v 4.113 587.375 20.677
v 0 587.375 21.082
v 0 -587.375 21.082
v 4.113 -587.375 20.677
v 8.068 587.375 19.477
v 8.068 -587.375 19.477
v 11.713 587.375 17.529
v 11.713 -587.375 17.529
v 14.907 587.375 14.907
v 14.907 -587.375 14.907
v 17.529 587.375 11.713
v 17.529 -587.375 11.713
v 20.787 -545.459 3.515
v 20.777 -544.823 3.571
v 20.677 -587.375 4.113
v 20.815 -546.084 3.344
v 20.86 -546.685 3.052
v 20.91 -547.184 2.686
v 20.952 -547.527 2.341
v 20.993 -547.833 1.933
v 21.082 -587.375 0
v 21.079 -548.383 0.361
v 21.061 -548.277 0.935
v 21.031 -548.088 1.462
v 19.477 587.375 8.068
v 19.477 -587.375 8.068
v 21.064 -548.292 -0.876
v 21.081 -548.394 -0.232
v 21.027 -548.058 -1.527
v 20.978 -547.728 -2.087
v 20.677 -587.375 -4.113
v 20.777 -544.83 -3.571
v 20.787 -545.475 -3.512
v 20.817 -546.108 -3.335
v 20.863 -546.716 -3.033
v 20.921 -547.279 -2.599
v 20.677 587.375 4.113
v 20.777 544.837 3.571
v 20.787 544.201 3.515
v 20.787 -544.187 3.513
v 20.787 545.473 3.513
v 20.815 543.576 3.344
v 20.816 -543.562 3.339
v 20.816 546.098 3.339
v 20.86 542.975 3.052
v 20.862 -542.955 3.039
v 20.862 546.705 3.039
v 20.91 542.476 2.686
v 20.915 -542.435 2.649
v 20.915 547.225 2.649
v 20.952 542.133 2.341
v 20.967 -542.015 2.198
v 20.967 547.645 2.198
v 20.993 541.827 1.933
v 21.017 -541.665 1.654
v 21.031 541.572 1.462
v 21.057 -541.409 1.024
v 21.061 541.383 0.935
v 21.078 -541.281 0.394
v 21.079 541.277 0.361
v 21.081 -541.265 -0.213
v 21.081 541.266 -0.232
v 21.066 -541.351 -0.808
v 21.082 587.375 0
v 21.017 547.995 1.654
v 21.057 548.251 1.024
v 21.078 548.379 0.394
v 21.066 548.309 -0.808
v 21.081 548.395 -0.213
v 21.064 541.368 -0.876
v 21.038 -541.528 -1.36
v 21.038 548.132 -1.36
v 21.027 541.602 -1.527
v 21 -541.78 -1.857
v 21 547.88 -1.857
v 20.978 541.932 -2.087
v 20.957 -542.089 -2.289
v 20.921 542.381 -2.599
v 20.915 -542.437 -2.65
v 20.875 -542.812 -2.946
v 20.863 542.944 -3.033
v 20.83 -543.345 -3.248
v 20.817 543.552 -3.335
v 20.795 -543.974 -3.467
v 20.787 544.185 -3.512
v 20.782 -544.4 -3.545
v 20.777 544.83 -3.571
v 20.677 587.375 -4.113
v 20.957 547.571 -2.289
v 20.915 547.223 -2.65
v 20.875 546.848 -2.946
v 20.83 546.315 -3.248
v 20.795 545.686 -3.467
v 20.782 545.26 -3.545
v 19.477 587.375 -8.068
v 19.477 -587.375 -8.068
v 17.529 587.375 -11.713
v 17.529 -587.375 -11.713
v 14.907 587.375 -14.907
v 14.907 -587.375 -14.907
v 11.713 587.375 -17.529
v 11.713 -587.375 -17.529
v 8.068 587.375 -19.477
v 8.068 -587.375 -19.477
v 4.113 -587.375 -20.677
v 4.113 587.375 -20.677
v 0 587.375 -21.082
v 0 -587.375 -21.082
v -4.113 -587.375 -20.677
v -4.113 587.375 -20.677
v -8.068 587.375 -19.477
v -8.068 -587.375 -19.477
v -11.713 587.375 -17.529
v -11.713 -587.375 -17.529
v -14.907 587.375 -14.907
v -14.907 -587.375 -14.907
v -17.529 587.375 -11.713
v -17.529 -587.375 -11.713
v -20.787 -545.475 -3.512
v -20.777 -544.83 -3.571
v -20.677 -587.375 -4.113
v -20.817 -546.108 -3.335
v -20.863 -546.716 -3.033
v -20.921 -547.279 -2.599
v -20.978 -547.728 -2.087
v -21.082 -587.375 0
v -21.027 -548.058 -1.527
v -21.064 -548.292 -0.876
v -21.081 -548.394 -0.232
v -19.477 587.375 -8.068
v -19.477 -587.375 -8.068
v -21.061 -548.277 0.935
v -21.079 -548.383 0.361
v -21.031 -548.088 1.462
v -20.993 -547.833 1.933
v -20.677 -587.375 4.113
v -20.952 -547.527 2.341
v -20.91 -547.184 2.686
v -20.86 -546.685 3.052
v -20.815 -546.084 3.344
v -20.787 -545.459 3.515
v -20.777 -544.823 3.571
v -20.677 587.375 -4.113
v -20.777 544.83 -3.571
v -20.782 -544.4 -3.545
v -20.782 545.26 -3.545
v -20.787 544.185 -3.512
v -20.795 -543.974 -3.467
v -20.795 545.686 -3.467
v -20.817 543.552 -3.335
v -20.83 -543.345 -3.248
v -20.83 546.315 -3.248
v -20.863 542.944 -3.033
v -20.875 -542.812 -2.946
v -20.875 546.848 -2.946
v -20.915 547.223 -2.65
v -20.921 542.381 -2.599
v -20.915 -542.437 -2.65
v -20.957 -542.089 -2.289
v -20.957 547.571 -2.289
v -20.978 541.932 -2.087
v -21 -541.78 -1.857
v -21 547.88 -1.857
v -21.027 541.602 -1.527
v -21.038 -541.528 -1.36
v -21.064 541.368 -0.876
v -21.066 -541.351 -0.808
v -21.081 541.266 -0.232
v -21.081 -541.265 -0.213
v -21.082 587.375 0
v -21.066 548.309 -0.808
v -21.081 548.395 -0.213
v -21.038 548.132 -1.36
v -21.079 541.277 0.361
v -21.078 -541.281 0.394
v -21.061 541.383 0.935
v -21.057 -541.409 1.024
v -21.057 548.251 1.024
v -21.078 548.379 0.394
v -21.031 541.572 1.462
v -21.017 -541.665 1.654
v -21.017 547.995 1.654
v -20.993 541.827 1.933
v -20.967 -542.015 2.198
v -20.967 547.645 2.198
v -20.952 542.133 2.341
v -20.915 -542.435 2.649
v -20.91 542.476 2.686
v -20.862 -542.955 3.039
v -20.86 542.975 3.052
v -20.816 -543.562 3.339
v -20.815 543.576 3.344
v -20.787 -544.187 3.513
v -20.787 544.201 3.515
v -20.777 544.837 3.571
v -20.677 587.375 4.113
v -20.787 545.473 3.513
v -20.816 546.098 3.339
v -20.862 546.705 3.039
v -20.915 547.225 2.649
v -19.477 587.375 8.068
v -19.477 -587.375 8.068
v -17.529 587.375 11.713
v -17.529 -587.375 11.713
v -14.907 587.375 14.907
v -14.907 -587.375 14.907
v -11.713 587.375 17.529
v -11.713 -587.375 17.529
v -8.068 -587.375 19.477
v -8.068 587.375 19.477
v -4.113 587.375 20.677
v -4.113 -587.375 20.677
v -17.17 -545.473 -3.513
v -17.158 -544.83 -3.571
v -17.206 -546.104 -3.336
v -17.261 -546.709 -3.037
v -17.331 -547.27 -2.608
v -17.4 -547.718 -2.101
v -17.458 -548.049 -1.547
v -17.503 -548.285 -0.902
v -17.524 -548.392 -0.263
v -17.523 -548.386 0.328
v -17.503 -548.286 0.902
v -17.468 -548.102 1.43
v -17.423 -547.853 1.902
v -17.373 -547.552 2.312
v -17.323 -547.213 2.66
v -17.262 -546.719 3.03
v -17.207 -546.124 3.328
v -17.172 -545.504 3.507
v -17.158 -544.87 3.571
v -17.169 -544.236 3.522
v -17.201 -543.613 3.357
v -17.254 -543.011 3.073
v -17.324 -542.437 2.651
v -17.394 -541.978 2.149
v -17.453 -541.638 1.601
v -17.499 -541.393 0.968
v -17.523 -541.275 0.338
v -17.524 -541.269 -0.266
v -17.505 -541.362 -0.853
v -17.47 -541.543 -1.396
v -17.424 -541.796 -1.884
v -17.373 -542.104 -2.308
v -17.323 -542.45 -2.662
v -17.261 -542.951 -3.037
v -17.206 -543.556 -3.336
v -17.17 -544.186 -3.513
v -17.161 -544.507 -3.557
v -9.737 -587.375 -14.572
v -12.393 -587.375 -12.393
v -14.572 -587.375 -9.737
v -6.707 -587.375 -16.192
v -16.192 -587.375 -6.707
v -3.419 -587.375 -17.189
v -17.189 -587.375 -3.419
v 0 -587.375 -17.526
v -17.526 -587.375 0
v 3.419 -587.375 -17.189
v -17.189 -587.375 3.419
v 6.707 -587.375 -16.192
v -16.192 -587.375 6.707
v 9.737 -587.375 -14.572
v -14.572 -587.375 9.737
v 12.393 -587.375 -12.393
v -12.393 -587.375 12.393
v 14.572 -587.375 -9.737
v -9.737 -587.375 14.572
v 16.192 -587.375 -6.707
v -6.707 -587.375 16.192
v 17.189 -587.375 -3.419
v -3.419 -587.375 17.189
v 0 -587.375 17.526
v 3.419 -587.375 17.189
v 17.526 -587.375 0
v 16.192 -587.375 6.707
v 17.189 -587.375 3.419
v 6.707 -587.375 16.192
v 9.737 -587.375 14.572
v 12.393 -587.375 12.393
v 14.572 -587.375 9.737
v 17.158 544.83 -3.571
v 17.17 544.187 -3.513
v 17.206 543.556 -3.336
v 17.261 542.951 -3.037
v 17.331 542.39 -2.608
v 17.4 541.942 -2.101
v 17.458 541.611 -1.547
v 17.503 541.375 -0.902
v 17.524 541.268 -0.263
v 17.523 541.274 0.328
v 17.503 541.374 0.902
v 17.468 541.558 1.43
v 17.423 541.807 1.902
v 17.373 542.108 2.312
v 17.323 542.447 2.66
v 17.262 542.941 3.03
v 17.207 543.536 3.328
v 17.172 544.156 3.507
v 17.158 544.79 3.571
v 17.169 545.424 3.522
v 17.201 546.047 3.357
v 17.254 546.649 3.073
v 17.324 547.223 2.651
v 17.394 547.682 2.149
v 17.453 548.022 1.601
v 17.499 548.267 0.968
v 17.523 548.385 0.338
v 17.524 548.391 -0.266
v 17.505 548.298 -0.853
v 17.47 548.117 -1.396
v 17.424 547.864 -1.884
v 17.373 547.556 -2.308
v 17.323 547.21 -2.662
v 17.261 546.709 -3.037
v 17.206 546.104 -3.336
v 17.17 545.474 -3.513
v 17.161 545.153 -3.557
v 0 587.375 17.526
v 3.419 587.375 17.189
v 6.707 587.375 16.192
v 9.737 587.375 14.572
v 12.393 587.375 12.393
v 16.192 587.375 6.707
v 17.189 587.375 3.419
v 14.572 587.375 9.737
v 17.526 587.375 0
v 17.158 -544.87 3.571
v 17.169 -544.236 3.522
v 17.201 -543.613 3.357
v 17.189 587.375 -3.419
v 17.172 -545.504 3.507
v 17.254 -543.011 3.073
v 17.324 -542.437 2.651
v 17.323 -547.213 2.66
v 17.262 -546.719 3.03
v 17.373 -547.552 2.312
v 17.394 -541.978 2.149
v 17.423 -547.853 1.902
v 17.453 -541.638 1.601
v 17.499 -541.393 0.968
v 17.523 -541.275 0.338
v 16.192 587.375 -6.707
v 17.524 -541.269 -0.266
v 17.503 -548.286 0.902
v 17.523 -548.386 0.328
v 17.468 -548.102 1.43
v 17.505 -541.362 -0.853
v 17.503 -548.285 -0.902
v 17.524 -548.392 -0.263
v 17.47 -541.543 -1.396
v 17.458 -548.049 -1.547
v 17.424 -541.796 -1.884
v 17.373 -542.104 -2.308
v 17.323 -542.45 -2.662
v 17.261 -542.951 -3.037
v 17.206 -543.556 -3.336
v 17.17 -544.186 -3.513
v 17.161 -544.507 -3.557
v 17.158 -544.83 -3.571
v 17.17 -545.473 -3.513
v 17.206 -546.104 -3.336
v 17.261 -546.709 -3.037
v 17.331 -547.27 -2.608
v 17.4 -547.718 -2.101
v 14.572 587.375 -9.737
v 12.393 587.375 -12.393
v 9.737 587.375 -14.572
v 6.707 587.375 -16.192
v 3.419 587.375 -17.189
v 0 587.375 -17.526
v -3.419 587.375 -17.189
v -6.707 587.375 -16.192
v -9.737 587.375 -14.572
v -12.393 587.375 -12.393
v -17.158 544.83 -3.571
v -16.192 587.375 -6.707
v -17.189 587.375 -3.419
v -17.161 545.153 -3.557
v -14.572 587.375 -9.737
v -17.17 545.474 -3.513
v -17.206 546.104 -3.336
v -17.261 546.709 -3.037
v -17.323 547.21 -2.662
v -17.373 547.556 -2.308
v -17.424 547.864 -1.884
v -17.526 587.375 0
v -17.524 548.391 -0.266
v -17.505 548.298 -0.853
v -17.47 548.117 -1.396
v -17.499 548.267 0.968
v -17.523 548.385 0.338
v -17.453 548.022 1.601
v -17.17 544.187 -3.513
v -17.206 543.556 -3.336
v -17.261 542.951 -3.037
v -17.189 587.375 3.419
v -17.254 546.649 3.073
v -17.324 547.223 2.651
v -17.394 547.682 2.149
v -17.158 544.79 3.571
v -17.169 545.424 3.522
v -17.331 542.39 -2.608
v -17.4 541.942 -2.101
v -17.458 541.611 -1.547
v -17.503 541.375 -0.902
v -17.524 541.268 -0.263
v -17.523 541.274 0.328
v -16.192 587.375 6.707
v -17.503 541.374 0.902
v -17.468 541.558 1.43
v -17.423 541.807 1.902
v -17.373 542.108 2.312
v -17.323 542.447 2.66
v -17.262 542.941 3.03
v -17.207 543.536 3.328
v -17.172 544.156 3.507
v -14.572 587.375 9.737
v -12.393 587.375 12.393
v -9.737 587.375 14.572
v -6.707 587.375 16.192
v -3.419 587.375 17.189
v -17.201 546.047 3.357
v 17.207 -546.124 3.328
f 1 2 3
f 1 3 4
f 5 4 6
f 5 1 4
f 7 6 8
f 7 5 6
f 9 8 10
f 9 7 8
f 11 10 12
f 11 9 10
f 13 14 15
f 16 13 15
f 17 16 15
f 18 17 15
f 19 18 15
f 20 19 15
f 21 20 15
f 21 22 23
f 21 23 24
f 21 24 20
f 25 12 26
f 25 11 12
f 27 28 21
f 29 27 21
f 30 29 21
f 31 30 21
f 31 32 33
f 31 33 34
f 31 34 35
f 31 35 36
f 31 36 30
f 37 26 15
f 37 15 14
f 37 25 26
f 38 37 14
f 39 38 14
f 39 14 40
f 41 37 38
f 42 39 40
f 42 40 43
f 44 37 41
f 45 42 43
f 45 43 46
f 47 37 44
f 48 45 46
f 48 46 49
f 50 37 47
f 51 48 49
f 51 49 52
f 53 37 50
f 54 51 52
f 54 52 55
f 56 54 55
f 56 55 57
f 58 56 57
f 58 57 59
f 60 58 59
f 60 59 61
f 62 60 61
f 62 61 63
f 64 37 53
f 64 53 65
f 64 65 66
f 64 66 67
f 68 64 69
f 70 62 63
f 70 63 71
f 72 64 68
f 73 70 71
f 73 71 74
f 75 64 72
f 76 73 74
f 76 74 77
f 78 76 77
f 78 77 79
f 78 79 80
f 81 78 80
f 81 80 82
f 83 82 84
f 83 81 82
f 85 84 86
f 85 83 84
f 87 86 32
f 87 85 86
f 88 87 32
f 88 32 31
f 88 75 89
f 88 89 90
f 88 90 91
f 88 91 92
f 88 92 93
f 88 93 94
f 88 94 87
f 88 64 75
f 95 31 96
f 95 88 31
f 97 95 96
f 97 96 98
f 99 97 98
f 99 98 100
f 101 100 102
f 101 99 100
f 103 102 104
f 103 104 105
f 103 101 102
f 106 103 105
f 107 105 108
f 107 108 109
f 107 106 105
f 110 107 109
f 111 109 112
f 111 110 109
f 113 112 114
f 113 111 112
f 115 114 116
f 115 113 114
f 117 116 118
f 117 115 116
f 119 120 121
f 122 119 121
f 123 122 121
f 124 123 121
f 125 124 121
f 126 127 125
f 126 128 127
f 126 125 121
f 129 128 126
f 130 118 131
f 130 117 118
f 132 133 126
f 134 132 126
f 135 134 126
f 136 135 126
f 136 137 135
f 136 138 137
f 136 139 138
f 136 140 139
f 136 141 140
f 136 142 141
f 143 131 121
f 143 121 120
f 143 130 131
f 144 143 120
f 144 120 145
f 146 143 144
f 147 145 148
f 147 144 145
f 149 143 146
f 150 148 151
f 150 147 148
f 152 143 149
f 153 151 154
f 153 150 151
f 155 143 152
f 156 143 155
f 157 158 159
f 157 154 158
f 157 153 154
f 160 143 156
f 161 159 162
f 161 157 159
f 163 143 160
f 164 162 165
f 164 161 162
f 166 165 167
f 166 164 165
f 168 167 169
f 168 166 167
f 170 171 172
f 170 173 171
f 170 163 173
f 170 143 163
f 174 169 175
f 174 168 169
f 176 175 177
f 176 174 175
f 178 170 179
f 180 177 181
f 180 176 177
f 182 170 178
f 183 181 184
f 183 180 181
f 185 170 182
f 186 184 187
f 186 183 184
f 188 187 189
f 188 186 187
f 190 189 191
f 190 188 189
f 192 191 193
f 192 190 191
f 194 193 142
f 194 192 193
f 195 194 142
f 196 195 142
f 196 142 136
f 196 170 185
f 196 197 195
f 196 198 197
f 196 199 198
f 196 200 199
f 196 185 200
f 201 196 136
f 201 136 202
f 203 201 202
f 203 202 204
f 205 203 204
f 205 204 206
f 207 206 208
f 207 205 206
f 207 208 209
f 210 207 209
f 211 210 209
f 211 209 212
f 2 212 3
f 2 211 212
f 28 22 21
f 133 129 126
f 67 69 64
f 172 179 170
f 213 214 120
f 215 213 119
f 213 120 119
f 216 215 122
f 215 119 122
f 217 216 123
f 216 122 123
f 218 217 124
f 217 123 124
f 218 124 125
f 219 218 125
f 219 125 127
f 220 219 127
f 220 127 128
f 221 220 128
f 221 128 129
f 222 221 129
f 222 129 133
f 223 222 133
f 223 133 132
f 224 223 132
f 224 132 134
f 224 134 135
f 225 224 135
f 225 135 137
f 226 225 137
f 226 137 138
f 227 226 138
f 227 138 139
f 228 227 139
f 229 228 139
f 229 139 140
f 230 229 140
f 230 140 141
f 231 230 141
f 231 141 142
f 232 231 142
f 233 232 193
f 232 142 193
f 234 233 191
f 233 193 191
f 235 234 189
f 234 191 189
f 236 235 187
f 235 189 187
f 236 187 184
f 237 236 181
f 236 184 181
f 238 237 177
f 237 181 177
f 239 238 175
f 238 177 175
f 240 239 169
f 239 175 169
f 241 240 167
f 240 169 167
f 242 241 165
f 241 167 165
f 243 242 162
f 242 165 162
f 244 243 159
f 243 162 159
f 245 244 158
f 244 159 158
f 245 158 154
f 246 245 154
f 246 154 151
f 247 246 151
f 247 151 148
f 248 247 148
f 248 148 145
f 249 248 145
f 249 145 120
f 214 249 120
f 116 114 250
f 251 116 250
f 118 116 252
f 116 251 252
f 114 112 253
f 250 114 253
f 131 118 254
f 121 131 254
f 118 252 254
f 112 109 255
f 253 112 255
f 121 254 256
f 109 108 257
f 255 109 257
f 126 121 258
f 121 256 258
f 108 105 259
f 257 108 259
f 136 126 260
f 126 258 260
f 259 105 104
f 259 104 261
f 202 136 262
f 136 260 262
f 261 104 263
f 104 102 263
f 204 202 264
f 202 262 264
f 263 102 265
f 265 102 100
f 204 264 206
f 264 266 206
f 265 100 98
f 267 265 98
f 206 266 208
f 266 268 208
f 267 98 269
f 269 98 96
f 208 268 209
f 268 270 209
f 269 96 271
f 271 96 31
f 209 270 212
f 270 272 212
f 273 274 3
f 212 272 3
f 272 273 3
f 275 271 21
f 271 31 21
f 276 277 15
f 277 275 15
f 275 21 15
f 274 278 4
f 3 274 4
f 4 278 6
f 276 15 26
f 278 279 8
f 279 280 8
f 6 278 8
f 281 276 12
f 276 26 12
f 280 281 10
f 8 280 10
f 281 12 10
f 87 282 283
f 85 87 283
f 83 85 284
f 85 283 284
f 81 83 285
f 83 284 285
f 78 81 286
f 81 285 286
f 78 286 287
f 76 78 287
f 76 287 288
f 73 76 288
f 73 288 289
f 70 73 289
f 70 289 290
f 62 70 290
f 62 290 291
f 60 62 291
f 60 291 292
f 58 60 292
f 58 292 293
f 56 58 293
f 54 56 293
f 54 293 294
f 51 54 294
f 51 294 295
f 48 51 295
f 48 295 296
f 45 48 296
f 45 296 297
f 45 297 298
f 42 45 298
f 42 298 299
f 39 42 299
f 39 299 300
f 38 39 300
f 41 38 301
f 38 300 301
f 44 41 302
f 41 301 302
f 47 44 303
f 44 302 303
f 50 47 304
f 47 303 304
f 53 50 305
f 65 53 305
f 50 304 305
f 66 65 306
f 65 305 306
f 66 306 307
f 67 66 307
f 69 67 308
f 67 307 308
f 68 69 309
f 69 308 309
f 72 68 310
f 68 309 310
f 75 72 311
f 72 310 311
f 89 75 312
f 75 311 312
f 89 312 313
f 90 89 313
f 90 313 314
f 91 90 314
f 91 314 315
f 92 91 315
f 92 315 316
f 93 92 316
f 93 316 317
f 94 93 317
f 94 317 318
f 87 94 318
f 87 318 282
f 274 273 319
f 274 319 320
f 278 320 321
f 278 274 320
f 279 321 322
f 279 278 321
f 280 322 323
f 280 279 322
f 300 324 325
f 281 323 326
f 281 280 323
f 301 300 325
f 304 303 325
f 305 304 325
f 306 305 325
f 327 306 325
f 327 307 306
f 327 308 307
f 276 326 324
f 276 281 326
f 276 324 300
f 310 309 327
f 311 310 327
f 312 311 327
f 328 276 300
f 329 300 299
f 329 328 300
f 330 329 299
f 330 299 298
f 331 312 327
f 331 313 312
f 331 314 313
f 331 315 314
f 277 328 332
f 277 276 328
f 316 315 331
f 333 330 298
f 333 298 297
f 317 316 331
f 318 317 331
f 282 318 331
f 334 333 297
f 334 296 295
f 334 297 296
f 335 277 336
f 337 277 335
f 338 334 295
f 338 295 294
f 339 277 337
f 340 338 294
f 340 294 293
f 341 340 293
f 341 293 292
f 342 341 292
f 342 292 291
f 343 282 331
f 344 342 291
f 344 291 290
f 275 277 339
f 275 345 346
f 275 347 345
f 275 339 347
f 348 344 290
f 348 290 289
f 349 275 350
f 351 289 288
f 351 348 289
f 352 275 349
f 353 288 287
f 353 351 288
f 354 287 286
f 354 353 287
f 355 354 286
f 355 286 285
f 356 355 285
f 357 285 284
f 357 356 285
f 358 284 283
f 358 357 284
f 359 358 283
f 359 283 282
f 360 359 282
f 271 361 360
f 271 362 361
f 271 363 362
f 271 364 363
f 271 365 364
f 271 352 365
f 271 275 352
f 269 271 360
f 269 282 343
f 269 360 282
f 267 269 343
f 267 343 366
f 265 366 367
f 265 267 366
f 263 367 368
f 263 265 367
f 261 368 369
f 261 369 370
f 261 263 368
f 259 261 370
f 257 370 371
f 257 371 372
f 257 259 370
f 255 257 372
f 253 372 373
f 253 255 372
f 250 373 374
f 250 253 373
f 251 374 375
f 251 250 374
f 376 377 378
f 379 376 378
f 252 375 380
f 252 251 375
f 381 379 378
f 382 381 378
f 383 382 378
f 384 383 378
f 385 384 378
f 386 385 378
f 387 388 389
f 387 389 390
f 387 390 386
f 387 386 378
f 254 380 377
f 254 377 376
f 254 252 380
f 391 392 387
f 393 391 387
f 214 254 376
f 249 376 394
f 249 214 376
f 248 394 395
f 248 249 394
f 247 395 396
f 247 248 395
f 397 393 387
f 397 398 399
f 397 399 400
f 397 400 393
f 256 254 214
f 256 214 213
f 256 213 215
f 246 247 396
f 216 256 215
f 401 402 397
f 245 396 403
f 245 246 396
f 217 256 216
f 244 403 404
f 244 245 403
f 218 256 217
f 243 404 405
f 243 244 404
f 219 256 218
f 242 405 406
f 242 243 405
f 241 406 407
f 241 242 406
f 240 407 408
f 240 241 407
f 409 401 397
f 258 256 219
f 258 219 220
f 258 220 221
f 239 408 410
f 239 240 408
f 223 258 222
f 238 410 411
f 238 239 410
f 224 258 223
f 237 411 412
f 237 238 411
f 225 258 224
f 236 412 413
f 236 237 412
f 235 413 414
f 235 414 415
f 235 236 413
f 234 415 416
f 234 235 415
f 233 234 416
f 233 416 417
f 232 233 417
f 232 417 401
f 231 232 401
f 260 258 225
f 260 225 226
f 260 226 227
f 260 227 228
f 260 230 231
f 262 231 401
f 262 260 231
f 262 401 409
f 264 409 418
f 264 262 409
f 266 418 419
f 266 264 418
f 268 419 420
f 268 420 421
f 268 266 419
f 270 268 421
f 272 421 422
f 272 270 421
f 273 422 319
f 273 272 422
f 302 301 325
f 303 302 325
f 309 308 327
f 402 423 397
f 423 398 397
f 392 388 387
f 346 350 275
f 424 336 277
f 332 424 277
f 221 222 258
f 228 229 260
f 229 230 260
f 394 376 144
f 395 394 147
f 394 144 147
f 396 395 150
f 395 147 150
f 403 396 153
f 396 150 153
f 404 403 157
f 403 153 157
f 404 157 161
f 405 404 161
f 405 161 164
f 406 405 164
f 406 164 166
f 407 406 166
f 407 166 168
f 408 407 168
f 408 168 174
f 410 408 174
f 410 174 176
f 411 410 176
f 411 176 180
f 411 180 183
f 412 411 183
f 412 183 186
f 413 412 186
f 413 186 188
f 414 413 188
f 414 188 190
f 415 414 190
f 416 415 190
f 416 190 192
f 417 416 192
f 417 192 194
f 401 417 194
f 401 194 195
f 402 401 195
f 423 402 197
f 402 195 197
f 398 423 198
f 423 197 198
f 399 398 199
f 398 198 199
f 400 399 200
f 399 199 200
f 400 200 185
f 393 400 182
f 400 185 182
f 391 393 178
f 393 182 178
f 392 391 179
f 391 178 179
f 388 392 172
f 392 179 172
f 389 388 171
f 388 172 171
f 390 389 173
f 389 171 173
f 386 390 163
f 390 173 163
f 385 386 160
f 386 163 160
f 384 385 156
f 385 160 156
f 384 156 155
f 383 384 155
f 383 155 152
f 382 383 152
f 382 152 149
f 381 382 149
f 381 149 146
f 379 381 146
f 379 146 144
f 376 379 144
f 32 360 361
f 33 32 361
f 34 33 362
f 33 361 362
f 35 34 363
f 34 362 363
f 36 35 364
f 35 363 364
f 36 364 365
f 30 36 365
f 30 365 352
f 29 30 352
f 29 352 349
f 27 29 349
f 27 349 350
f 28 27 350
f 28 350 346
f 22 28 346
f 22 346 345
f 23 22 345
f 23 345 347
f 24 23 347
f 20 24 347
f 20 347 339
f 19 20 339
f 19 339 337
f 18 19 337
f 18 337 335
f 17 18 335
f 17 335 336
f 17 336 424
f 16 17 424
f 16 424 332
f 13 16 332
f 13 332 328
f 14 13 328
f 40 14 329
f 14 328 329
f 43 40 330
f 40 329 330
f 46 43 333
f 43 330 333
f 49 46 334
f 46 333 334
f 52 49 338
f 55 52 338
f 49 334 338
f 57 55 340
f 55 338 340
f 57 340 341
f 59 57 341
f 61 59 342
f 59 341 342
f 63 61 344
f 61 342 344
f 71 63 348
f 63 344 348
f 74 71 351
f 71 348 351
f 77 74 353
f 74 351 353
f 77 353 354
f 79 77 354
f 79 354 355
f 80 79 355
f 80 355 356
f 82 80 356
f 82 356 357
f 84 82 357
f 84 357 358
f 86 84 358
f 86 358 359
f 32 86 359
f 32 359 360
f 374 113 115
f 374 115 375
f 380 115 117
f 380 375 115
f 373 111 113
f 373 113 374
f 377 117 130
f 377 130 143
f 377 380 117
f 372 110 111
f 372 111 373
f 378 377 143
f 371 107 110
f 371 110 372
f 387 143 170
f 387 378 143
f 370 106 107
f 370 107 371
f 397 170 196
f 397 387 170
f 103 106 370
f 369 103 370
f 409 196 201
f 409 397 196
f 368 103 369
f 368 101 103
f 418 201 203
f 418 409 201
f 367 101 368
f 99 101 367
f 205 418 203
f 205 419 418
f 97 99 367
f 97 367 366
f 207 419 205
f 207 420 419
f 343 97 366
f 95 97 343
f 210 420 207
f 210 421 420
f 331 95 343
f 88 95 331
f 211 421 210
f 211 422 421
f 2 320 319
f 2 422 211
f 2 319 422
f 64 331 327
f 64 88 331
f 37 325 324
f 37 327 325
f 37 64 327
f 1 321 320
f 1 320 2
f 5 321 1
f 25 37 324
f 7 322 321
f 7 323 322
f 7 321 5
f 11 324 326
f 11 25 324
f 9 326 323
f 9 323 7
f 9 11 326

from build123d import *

# Parameters (mm, degrees)
SKETCH2_R               = 21.082
SKETCH2_R_2             = 17.526
BOSS_EXTRUDE1_DEPTH     = 587.375
F_1_4_CLEARANCE_HOLE1_D = 7.14248


with BuildPart() as part:
    # Sketch2 → Boss-Extrude1 (new, symmetric)
    with BuildSketch(Plane(origin=(0, 0, 0), x_dir=(1, 0, 0), z_dir=(0, 1, 0))):
        with Locations(Location((0, 0, 0), (0, 0, 270))):
            Circle(SKETCH2_R)
        with Locations(Location((0, 0, 0), (0, 0, 270))):
            Circle(SKETCH2_R_2, mode=Mode.SUBTRACT)
    extrude(amount=BOSS_EXTRUDE1_DEPTH, both=True)

    # 1/4 Clearance Hole1 (through all)
    with Locations(Plane(origin=(21.082, 544.83, 0), x_dir=(0, 0, 1), z_dir=(1, 0, 0))):
        with Locations((0, 0), (0, 1089.66)):
            Hole(F_1_4_CLEARANCE_HOLE1_D / 2)


solid = part.part
